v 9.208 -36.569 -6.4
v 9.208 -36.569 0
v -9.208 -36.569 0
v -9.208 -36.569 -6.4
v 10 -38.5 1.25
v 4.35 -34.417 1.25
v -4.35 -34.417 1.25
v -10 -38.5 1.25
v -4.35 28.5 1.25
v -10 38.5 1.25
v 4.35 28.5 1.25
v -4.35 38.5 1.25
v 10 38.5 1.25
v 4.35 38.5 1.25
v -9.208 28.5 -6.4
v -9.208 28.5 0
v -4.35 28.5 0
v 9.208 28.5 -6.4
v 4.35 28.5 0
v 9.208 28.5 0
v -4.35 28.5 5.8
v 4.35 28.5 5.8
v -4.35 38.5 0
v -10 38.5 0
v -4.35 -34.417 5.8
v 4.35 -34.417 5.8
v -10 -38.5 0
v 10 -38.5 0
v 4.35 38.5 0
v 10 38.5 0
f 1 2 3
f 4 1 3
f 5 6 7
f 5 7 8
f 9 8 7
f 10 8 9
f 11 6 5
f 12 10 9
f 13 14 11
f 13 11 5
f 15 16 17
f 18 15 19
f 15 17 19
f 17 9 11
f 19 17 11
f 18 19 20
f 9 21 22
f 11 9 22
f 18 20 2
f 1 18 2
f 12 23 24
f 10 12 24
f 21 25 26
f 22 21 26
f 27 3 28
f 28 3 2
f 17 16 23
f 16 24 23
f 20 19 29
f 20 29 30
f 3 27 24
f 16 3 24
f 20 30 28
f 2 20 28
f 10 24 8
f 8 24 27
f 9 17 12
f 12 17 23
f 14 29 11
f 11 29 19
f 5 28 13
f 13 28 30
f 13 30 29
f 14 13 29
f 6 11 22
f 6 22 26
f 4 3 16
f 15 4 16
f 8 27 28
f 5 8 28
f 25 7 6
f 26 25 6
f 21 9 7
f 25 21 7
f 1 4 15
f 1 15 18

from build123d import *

# Parameters (mm, degrees)
F1_DEPTH = 1.25
F2_W     = 8.7
F2_H     = 62.917138
F3_DEPTH = 5.8
F5_DEPTH = 6.4


with BuildPart() as f1:
    # F0 (on Top) → F1 (new body)
    with BuildSketch(Plane.XY):
        Polygon((-10, -38.5), (10, -38.5), (10, 38.5), (4.35, 38.5), (4.35, 28.5), (-4.35, 28.5), (-4.35, 38.5), (-10, 38.5), align=None)
    extrude(amount=F1_DEPTH)

    # F2 (on face) → F3 (join)
    with BuildSketch(Plane(origin=(0, 0, 0), x_dir=(1, 0, 0), z_dir=(0, 0, -1))):
        with Locations((0, 2.958569)):
            Rectangle(F2_W, F2_H)
    extrude(amount=-F3_DEPTH)

    # F4 (on face) → F5 (join)
    with BuildSketch(Plane(origin=(0, 0, 0), x_dir=(1, 0, 0), z_dir=(0, 0, -1))):
        Polygon((-9.20814, 36.568932), (-9.20814, -28.5), (-4.35, -28.5), (4.35, -28.5), (9.20814, -28.5), (9.20814, 36.568932), align=None)
    extrude(amount=F5_DEPTH)


solid = f1.part
